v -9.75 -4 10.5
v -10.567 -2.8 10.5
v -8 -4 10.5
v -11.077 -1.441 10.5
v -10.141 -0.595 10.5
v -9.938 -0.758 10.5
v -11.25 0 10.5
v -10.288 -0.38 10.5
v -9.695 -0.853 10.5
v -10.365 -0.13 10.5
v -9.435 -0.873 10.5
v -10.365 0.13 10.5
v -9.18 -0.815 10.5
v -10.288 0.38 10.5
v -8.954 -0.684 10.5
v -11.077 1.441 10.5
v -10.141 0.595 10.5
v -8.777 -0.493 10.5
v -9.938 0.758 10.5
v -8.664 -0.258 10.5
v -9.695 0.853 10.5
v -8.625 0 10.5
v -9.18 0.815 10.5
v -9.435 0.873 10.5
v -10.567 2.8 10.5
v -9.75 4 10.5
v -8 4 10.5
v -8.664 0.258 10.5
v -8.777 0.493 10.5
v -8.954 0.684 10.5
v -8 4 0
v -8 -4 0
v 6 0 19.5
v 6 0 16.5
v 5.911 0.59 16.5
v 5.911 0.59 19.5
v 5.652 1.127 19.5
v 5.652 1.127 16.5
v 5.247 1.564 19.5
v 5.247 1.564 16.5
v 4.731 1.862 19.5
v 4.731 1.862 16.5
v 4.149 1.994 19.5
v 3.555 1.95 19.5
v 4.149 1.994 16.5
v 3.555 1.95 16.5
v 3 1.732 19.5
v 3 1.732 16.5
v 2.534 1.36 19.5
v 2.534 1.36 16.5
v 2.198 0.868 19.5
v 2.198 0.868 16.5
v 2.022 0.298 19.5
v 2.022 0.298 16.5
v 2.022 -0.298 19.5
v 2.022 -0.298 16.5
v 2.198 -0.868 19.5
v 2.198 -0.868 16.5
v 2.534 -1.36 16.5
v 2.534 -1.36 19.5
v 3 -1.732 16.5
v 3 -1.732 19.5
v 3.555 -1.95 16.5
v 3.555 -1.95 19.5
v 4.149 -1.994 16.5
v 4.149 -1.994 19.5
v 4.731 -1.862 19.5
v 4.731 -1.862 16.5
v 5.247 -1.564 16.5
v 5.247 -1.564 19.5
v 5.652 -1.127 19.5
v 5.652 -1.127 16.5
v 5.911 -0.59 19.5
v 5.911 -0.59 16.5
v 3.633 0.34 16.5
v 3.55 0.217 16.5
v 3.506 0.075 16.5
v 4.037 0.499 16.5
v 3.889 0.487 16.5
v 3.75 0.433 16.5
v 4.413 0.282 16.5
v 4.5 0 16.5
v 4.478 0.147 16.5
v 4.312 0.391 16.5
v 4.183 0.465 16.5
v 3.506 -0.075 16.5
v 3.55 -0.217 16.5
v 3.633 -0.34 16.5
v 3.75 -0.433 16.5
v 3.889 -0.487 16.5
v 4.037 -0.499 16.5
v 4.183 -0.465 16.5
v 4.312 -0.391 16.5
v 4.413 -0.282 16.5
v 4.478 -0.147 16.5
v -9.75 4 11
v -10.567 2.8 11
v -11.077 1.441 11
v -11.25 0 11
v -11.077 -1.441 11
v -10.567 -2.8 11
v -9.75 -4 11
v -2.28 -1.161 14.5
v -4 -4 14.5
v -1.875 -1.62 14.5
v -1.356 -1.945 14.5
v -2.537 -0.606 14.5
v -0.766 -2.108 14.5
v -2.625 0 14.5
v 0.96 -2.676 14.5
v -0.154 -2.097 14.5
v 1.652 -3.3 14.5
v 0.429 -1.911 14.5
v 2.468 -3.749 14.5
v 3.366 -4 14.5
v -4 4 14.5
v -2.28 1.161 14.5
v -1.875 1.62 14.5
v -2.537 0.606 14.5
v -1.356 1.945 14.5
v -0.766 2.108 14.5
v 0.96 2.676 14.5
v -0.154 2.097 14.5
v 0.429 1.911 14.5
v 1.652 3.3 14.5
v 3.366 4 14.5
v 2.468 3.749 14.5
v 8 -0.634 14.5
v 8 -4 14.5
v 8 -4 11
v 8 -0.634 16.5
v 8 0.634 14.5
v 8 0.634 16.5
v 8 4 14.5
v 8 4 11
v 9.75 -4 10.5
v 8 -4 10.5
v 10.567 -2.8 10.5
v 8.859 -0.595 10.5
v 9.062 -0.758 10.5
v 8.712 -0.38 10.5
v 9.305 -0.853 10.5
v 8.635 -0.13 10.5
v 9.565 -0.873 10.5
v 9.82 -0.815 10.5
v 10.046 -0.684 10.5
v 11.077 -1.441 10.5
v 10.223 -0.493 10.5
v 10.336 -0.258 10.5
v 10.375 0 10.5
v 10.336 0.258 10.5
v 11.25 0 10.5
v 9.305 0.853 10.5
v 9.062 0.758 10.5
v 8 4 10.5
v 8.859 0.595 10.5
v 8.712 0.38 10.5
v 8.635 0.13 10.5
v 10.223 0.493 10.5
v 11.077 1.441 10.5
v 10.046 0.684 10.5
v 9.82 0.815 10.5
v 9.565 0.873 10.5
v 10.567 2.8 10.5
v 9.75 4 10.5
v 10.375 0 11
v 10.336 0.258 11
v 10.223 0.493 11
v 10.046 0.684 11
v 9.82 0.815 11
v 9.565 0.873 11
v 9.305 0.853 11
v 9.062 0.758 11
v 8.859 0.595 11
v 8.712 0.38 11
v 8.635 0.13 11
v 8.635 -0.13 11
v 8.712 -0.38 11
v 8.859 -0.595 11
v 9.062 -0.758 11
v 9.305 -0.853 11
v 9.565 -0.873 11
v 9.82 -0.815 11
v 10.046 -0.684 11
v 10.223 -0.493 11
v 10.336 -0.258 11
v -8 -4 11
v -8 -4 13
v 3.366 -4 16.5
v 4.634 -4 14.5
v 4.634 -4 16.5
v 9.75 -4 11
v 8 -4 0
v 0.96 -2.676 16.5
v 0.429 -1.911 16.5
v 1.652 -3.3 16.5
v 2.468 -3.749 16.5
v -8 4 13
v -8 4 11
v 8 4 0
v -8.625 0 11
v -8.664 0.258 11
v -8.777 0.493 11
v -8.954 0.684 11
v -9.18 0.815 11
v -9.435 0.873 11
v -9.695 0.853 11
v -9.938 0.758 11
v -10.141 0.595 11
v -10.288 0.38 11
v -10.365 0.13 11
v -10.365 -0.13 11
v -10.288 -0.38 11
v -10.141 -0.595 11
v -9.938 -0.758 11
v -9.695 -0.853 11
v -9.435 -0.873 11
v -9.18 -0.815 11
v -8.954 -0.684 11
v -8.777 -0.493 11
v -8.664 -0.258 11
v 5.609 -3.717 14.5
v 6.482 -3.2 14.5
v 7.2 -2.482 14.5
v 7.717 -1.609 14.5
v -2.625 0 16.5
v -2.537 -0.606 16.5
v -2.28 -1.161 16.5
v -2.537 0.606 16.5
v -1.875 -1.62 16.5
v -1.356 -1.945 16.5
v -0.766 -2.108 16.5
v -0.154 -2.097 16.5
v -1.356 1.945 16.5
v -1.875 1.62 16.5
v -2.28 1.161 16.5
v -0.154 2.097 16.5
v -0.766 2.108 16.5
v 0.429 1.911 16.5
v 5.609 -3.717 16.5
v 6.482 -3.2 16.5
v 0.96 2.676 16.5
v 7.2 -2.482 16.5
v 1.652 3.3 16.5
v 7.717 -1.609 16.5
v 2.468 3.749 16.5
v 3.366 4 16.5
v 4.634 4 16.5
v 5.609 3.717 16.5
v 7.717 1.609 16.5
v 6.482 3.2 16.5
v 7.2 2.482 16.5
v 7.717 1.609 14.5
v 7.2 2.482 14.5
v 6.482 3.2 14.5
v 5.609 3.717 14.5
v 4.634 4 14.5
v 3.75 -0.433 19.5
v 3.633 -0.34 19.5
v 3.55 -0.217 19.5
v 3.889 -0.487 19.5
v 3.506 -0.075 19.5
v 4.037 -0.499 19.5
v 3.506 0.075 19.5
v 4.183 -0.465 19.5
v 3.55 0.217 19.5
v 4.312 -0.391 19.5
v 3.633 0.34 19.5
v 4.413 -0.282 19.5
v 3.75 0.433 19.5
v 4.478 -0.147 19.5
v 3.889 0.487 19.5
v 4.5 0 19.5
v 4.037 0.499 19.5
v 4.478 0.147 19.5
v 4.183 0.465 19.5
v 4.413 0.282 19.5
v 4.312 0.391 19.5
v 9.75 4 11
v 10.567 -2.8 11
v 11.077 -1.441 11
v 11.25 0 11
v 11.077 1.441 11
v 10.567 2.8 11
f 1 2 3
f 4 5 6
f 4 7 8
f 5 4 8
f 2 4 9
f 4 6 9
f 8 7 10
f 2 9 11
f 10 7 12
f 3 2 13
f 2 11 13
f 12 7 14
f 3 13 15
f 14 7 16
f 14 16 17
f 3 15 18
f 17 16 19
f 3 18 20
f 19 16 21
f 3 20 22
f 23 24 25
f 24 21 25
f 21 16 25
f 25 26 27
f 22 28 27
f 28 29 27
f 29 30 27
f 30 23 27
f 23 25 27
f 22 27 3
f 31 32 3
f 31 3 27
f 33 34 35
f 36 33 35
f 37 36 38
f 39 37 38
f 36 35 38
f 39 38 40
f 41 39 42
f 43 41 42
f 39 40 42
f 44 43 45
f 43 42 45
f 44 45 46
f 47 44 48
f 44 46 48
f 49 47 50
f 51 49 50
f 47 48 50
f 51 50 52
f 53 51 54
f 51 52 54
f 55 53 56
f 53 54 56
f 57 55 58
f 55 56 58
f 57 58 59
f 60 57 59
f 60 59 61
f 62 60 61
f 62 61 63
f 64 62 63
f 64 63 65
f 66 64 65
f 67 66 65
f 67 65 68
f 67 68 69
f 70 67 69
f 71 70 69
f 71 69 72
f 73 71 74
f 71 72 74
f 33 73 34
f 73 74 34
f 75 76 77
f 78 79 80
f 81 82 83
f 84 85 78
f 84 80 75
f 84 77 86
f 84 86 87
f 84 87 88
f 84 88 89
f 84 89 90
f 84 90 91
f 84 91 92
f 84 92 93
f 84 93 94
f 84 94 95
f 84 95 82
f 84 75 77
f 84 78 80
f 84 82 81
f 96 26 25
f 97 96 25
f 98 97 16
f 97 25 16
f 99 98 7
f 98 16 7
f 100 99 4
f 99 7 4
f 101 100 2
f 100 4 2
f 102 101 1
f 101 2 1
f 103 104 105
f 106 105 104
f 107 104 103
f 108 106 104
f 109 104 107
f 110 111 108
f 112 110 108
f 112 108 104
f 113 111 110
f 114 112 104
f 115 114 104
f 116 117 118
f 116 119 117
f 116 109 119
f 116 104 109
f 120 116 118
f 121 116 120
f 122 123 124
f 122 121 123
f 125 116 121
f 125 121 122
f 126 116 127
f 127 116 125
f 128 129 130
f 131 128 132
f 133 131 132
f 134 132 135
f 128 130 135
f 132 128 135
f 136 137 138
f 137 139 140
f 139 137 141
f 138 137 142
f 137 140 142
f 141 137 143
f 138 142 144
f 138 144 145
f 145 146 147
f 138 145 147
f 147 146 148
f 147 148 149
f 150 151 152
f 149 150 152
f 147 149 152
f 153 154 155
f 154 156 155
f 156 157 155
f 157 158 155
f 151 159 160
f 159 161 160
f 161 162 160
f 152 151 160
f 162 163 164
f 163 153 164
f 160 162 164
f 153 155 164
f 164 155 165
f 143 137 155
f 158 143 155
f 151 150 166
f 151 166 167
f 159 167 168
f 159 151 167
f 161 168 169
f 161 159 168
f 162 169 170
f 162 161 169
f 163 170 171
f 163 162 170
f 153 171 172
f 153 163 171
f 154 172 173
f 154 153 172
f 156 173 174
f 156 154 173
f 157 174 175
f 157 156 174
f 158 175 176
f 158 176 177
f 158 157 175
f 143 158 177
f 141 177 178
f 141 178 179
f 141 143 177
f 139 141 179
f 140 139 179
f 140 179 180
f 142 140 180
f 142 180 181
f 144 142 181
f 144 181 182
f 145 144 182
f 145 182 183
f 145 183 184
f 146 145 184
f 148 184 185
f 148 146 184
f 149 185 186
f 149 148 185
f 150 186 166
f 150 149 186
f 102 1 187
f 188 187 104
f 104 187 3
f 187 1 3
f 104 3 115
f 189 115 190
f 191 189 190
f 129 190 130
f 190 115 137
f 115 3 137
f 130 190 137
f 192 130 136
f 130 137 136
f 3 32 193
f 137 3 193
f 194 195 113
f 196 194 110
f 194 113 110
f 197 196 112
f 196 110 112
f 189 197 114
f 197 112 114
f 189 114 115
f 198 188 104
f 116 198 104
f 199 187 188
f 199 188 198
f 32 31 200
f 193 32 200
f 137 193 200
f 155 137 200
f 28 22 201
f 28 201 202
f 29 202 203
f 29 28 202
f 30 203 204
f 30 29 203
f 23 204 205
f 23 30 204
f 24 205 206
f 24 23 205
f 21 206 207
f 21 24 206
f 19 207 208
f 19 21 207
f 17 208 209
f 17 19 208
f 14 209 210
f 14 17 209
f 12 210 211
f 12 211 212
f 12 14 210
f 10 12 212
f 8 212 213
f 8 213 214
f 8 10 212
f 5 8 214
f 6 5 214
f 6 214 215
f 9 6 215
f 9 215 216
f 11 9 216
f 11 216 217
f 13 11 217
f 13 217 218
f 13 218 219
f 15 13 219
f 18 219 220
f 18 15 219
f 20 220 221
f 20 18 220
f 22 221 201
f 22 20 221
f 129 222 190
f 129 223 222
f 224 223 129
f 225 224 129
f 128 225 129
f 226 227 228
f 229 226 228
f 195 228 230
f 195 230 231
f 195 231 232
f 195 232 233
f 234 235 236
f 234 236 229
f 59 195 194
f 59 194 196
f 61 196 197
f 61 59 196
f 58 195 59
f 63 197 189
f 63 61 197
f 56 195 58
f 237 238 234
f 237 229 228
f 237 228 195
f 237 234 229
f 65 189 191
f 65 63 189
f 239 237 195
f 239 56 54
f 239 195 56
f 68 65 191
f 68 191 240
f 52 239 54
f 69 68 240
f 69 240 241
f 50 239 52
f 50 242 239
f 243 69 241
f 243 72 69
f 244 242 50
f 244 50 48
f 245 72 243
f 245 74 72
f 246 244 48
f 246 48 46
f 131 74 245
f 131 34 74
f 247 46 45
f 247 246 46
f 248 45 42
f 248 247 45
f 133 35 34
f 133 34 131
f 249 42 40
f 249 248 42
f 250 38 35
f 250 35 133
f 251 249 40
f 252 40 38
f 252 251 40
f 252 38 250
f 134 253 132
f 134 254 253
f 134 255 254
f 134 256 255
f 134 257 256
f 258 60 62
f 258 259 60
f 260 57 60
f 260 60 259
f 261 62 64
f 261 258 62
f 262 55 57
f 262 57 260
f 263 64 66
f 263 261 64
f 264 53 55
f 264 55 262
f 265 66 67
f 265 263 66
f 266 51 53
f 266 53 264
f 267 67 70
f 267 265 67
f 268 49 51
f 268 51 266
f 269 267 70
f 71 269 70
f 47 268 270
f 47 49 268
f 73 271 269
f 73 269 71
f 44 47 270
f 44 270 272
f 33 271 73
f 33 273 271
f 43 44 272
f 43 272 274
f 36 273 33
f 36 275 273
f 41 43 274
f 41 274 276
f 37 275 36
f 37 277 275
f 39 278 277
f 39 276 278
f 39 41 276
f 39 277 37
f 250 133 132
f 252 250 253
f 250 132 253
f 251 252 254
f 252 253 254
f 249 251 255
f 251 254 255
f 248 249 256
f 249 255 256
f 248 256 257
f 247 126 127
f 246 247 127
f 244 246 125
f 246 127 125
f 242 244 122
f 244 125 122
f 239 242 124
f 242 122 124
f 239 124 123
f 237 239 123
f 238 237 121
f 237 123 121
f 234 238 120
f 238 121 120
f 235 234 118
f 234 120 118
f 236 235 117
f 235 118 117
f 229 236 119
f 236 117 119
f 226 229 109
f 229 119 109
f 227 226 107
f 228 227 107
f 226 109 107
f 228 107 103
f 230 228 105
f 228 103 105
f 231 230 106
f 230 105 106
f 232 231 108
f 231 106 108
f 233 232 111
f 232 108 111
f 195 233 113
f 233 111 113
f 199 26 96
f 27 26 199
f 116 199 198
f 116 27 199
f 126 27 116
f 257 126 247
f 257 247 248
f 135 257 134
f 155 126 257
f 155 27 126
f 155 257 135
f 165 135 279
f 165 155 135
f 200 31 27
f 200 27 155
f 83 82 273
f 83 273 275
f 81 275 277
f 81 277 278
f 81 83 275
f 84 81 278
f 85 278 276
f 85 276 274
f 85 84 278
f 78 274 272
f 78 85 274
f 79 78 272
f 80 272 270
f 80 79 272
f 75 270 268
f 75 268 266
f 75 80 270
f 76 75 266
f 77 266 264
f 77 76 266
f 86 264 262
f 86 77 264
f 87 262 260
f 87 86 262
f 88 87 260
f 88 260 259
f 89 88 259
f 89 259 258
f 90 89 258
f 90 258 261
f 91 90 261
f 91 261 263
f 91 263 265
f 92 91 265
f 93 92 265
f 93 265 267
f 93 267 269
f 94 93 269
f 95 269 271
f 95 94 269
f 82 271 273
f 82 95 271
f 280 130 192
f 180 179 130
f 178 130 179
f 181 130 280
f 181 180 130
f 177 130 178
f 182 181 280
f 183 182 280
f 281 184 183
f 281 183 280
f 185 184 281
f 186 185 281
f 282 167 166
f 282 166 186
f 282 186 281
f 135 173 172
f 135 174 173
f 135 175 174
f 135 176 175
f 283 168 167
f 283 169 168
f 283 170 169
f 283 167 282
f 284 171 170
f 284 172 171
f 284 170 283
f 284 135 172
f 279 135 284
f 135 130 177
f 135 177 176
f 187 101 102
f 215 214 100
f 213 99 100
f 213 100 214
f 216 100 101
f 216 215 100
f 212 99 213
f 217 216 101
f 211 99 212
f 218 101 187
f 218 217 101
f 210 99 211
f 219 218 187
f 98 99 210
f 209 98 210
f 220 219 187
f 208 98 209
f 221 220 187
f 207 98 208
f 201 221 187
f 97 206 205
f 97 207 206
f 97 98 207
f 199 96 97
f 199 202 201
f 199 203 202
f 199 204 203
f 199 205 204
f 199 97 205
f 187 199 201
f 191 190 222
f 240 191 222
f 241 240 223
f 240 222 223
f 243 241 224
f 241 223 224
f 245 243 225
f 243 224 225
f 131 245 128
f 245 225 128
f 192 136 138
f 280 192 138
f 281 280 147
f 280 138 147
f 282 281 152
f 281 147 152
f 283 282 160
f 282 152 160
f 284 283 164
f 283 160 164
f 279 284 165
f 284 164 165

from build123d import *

# Parameters (mm, degrees)
F0_W      = 16
F0_H      = 8
F1_DEPTH  = 10.5
F2_R      = 0.875
F3_DEPTH  = 0.5
F4_W      = 16
F4_H      = 8
F5_DEPTH  = 3.5
F7_DEPTH  = 25
F9_DEPTH  = 2
F10_DEPTH = 25
F11_DEPTH = 25
F12_DEPTH = 25
F13_R     = 2
F13_R_2   = 0.5
F14_DEPTH = 3


with BuildPart() as f1:
    # F0 (on Top) → F1 (new body)
    with BuildSketch(Plane.XY):
        Rectangle(F0_W, F0_H)
    extrude(amount=F1_DEPTH)

    # F2 (on face) → F3 (join)
    with BuildSketch(Plane.XY.offset(10.5)):
        with BuildLine():
            ThreePointArc((9.75, -4), (11.25, 0), (9.75, 4))
            Line((9.75, 4), (-9.75, 4))
            ThreePointArc((-9.75, 4), (-11.25, 0), (-9.75, -4))
            Line((-9.75, -4), (9.75, -4))
        make_face()
        with Locations((-9.5, 0)):
            Circle(F2_R, mode=Mode.SUBTRACT)
        with Locations((9.5, 0)):
            Circle(F2_R, mode=Mode.SUBTRACT)
    extrude(amount=F3_DEPTH)

    # F4 (on face) → F5 (join)
    with BuildSketch(Plane.XY.offset(11)):
        Rectangle(F4_W, F4_H)
    extrude(amount=F5_DEPTH)

    # F6 (on face) → F7 (cut)
    with BuildSketch(Plane.XZ.offset(4)):
        Polygon((-8, 14.5), (-8, 13), (-4, 14.5), align=None)
    extrude(amount=-F7_DEPTH, mode=Mode.SUBTRACT)

    # F8 (on face) → F9 (join)
    with BuildSketch(Plane.XY.offset(14.5)):
        with BuildLine():
            ThreePointArc((0.4292361111, -1.9110586725), (4.9851157927, -3.928364402), (8.05, 0))
            ThreePointArc((8.05, 0), (4.9851157927, 3.928364402), (0.4292361111, 1.9110586725))
            ThreePointArc((0.4292361111, 1.9110586725), (1.3014232895, 1.1271641992), (1.625, 0))
            ThreePointArc((1.625, 0), (1.3014232895, -1.1271641992), (0.4292361111, -1.9110586725))
        make_face()
        with BuildLine():
            ThreePointArc((1.625, 0), (1.3014232895, 1.1271641992), (0.4292361111, 1.9110586725))
            ThreePointArc((0.4292361111, 1.9110586725), (-0.05, 0), (0.4292361111, -1.9110586725))
            ThreePointArc((0.4292361111, -1.9110586725), (1.3014232895, -1.1271641992), (1.625, 0))
        make_face()
        with BuildLine():
            ThreePointArc((0.4292361111, -1.9110586725), (-0.05, 0), (0.4292361111, 1.9110586725))
            ThreePointArc((0.4292361111, 1.9110586725), (-2.625, 0), (0.4292361111, -1.9110586725))
        make_face()
    extrude(amount=F9_DEPTH)

    # F10 (cut): a face of the model
    f10_faces = [f1.faces().sort_by_distance(p)[0] for p in [
        (4, 4.0200106199, 14.5),
    ]]
    extrude(f10_faces, amount=-F10_DEPTH, mode=Mode.SUBTRACT)

    # F11 (cut): a face of the model
    f11_faces = [f1.faces().sort_by_distance(p)[0] for p in [
        (4, -4.0200106199, 14.5),
    ]]
    extrude(f11_faces, amount=-F11_DEPTH, mode=Mode.SUBTRACT)

    # F12 (cut): a face of the model
    f12_faces = [f1.faces().sort_by_distance(p)[0] for p in [
        (8.0200106199, 0, 14.5),
    ]]
    extrude(f12_faces, amount=-F12_DEPTH, mode=Mode.SUBTRACT)

    # F13 (on face) → F14 (join)
    with BuildSketch(Plane.XY.offset(16.5)):
        with Locations((4, 0)):
            Circle(F13_R)
        with Locations((4, 0)):
            Circle(F13_R_2, mode=Mode.SUBTRACT)
    extrude(amount=F14_DEPTH)


solid = f1.part
